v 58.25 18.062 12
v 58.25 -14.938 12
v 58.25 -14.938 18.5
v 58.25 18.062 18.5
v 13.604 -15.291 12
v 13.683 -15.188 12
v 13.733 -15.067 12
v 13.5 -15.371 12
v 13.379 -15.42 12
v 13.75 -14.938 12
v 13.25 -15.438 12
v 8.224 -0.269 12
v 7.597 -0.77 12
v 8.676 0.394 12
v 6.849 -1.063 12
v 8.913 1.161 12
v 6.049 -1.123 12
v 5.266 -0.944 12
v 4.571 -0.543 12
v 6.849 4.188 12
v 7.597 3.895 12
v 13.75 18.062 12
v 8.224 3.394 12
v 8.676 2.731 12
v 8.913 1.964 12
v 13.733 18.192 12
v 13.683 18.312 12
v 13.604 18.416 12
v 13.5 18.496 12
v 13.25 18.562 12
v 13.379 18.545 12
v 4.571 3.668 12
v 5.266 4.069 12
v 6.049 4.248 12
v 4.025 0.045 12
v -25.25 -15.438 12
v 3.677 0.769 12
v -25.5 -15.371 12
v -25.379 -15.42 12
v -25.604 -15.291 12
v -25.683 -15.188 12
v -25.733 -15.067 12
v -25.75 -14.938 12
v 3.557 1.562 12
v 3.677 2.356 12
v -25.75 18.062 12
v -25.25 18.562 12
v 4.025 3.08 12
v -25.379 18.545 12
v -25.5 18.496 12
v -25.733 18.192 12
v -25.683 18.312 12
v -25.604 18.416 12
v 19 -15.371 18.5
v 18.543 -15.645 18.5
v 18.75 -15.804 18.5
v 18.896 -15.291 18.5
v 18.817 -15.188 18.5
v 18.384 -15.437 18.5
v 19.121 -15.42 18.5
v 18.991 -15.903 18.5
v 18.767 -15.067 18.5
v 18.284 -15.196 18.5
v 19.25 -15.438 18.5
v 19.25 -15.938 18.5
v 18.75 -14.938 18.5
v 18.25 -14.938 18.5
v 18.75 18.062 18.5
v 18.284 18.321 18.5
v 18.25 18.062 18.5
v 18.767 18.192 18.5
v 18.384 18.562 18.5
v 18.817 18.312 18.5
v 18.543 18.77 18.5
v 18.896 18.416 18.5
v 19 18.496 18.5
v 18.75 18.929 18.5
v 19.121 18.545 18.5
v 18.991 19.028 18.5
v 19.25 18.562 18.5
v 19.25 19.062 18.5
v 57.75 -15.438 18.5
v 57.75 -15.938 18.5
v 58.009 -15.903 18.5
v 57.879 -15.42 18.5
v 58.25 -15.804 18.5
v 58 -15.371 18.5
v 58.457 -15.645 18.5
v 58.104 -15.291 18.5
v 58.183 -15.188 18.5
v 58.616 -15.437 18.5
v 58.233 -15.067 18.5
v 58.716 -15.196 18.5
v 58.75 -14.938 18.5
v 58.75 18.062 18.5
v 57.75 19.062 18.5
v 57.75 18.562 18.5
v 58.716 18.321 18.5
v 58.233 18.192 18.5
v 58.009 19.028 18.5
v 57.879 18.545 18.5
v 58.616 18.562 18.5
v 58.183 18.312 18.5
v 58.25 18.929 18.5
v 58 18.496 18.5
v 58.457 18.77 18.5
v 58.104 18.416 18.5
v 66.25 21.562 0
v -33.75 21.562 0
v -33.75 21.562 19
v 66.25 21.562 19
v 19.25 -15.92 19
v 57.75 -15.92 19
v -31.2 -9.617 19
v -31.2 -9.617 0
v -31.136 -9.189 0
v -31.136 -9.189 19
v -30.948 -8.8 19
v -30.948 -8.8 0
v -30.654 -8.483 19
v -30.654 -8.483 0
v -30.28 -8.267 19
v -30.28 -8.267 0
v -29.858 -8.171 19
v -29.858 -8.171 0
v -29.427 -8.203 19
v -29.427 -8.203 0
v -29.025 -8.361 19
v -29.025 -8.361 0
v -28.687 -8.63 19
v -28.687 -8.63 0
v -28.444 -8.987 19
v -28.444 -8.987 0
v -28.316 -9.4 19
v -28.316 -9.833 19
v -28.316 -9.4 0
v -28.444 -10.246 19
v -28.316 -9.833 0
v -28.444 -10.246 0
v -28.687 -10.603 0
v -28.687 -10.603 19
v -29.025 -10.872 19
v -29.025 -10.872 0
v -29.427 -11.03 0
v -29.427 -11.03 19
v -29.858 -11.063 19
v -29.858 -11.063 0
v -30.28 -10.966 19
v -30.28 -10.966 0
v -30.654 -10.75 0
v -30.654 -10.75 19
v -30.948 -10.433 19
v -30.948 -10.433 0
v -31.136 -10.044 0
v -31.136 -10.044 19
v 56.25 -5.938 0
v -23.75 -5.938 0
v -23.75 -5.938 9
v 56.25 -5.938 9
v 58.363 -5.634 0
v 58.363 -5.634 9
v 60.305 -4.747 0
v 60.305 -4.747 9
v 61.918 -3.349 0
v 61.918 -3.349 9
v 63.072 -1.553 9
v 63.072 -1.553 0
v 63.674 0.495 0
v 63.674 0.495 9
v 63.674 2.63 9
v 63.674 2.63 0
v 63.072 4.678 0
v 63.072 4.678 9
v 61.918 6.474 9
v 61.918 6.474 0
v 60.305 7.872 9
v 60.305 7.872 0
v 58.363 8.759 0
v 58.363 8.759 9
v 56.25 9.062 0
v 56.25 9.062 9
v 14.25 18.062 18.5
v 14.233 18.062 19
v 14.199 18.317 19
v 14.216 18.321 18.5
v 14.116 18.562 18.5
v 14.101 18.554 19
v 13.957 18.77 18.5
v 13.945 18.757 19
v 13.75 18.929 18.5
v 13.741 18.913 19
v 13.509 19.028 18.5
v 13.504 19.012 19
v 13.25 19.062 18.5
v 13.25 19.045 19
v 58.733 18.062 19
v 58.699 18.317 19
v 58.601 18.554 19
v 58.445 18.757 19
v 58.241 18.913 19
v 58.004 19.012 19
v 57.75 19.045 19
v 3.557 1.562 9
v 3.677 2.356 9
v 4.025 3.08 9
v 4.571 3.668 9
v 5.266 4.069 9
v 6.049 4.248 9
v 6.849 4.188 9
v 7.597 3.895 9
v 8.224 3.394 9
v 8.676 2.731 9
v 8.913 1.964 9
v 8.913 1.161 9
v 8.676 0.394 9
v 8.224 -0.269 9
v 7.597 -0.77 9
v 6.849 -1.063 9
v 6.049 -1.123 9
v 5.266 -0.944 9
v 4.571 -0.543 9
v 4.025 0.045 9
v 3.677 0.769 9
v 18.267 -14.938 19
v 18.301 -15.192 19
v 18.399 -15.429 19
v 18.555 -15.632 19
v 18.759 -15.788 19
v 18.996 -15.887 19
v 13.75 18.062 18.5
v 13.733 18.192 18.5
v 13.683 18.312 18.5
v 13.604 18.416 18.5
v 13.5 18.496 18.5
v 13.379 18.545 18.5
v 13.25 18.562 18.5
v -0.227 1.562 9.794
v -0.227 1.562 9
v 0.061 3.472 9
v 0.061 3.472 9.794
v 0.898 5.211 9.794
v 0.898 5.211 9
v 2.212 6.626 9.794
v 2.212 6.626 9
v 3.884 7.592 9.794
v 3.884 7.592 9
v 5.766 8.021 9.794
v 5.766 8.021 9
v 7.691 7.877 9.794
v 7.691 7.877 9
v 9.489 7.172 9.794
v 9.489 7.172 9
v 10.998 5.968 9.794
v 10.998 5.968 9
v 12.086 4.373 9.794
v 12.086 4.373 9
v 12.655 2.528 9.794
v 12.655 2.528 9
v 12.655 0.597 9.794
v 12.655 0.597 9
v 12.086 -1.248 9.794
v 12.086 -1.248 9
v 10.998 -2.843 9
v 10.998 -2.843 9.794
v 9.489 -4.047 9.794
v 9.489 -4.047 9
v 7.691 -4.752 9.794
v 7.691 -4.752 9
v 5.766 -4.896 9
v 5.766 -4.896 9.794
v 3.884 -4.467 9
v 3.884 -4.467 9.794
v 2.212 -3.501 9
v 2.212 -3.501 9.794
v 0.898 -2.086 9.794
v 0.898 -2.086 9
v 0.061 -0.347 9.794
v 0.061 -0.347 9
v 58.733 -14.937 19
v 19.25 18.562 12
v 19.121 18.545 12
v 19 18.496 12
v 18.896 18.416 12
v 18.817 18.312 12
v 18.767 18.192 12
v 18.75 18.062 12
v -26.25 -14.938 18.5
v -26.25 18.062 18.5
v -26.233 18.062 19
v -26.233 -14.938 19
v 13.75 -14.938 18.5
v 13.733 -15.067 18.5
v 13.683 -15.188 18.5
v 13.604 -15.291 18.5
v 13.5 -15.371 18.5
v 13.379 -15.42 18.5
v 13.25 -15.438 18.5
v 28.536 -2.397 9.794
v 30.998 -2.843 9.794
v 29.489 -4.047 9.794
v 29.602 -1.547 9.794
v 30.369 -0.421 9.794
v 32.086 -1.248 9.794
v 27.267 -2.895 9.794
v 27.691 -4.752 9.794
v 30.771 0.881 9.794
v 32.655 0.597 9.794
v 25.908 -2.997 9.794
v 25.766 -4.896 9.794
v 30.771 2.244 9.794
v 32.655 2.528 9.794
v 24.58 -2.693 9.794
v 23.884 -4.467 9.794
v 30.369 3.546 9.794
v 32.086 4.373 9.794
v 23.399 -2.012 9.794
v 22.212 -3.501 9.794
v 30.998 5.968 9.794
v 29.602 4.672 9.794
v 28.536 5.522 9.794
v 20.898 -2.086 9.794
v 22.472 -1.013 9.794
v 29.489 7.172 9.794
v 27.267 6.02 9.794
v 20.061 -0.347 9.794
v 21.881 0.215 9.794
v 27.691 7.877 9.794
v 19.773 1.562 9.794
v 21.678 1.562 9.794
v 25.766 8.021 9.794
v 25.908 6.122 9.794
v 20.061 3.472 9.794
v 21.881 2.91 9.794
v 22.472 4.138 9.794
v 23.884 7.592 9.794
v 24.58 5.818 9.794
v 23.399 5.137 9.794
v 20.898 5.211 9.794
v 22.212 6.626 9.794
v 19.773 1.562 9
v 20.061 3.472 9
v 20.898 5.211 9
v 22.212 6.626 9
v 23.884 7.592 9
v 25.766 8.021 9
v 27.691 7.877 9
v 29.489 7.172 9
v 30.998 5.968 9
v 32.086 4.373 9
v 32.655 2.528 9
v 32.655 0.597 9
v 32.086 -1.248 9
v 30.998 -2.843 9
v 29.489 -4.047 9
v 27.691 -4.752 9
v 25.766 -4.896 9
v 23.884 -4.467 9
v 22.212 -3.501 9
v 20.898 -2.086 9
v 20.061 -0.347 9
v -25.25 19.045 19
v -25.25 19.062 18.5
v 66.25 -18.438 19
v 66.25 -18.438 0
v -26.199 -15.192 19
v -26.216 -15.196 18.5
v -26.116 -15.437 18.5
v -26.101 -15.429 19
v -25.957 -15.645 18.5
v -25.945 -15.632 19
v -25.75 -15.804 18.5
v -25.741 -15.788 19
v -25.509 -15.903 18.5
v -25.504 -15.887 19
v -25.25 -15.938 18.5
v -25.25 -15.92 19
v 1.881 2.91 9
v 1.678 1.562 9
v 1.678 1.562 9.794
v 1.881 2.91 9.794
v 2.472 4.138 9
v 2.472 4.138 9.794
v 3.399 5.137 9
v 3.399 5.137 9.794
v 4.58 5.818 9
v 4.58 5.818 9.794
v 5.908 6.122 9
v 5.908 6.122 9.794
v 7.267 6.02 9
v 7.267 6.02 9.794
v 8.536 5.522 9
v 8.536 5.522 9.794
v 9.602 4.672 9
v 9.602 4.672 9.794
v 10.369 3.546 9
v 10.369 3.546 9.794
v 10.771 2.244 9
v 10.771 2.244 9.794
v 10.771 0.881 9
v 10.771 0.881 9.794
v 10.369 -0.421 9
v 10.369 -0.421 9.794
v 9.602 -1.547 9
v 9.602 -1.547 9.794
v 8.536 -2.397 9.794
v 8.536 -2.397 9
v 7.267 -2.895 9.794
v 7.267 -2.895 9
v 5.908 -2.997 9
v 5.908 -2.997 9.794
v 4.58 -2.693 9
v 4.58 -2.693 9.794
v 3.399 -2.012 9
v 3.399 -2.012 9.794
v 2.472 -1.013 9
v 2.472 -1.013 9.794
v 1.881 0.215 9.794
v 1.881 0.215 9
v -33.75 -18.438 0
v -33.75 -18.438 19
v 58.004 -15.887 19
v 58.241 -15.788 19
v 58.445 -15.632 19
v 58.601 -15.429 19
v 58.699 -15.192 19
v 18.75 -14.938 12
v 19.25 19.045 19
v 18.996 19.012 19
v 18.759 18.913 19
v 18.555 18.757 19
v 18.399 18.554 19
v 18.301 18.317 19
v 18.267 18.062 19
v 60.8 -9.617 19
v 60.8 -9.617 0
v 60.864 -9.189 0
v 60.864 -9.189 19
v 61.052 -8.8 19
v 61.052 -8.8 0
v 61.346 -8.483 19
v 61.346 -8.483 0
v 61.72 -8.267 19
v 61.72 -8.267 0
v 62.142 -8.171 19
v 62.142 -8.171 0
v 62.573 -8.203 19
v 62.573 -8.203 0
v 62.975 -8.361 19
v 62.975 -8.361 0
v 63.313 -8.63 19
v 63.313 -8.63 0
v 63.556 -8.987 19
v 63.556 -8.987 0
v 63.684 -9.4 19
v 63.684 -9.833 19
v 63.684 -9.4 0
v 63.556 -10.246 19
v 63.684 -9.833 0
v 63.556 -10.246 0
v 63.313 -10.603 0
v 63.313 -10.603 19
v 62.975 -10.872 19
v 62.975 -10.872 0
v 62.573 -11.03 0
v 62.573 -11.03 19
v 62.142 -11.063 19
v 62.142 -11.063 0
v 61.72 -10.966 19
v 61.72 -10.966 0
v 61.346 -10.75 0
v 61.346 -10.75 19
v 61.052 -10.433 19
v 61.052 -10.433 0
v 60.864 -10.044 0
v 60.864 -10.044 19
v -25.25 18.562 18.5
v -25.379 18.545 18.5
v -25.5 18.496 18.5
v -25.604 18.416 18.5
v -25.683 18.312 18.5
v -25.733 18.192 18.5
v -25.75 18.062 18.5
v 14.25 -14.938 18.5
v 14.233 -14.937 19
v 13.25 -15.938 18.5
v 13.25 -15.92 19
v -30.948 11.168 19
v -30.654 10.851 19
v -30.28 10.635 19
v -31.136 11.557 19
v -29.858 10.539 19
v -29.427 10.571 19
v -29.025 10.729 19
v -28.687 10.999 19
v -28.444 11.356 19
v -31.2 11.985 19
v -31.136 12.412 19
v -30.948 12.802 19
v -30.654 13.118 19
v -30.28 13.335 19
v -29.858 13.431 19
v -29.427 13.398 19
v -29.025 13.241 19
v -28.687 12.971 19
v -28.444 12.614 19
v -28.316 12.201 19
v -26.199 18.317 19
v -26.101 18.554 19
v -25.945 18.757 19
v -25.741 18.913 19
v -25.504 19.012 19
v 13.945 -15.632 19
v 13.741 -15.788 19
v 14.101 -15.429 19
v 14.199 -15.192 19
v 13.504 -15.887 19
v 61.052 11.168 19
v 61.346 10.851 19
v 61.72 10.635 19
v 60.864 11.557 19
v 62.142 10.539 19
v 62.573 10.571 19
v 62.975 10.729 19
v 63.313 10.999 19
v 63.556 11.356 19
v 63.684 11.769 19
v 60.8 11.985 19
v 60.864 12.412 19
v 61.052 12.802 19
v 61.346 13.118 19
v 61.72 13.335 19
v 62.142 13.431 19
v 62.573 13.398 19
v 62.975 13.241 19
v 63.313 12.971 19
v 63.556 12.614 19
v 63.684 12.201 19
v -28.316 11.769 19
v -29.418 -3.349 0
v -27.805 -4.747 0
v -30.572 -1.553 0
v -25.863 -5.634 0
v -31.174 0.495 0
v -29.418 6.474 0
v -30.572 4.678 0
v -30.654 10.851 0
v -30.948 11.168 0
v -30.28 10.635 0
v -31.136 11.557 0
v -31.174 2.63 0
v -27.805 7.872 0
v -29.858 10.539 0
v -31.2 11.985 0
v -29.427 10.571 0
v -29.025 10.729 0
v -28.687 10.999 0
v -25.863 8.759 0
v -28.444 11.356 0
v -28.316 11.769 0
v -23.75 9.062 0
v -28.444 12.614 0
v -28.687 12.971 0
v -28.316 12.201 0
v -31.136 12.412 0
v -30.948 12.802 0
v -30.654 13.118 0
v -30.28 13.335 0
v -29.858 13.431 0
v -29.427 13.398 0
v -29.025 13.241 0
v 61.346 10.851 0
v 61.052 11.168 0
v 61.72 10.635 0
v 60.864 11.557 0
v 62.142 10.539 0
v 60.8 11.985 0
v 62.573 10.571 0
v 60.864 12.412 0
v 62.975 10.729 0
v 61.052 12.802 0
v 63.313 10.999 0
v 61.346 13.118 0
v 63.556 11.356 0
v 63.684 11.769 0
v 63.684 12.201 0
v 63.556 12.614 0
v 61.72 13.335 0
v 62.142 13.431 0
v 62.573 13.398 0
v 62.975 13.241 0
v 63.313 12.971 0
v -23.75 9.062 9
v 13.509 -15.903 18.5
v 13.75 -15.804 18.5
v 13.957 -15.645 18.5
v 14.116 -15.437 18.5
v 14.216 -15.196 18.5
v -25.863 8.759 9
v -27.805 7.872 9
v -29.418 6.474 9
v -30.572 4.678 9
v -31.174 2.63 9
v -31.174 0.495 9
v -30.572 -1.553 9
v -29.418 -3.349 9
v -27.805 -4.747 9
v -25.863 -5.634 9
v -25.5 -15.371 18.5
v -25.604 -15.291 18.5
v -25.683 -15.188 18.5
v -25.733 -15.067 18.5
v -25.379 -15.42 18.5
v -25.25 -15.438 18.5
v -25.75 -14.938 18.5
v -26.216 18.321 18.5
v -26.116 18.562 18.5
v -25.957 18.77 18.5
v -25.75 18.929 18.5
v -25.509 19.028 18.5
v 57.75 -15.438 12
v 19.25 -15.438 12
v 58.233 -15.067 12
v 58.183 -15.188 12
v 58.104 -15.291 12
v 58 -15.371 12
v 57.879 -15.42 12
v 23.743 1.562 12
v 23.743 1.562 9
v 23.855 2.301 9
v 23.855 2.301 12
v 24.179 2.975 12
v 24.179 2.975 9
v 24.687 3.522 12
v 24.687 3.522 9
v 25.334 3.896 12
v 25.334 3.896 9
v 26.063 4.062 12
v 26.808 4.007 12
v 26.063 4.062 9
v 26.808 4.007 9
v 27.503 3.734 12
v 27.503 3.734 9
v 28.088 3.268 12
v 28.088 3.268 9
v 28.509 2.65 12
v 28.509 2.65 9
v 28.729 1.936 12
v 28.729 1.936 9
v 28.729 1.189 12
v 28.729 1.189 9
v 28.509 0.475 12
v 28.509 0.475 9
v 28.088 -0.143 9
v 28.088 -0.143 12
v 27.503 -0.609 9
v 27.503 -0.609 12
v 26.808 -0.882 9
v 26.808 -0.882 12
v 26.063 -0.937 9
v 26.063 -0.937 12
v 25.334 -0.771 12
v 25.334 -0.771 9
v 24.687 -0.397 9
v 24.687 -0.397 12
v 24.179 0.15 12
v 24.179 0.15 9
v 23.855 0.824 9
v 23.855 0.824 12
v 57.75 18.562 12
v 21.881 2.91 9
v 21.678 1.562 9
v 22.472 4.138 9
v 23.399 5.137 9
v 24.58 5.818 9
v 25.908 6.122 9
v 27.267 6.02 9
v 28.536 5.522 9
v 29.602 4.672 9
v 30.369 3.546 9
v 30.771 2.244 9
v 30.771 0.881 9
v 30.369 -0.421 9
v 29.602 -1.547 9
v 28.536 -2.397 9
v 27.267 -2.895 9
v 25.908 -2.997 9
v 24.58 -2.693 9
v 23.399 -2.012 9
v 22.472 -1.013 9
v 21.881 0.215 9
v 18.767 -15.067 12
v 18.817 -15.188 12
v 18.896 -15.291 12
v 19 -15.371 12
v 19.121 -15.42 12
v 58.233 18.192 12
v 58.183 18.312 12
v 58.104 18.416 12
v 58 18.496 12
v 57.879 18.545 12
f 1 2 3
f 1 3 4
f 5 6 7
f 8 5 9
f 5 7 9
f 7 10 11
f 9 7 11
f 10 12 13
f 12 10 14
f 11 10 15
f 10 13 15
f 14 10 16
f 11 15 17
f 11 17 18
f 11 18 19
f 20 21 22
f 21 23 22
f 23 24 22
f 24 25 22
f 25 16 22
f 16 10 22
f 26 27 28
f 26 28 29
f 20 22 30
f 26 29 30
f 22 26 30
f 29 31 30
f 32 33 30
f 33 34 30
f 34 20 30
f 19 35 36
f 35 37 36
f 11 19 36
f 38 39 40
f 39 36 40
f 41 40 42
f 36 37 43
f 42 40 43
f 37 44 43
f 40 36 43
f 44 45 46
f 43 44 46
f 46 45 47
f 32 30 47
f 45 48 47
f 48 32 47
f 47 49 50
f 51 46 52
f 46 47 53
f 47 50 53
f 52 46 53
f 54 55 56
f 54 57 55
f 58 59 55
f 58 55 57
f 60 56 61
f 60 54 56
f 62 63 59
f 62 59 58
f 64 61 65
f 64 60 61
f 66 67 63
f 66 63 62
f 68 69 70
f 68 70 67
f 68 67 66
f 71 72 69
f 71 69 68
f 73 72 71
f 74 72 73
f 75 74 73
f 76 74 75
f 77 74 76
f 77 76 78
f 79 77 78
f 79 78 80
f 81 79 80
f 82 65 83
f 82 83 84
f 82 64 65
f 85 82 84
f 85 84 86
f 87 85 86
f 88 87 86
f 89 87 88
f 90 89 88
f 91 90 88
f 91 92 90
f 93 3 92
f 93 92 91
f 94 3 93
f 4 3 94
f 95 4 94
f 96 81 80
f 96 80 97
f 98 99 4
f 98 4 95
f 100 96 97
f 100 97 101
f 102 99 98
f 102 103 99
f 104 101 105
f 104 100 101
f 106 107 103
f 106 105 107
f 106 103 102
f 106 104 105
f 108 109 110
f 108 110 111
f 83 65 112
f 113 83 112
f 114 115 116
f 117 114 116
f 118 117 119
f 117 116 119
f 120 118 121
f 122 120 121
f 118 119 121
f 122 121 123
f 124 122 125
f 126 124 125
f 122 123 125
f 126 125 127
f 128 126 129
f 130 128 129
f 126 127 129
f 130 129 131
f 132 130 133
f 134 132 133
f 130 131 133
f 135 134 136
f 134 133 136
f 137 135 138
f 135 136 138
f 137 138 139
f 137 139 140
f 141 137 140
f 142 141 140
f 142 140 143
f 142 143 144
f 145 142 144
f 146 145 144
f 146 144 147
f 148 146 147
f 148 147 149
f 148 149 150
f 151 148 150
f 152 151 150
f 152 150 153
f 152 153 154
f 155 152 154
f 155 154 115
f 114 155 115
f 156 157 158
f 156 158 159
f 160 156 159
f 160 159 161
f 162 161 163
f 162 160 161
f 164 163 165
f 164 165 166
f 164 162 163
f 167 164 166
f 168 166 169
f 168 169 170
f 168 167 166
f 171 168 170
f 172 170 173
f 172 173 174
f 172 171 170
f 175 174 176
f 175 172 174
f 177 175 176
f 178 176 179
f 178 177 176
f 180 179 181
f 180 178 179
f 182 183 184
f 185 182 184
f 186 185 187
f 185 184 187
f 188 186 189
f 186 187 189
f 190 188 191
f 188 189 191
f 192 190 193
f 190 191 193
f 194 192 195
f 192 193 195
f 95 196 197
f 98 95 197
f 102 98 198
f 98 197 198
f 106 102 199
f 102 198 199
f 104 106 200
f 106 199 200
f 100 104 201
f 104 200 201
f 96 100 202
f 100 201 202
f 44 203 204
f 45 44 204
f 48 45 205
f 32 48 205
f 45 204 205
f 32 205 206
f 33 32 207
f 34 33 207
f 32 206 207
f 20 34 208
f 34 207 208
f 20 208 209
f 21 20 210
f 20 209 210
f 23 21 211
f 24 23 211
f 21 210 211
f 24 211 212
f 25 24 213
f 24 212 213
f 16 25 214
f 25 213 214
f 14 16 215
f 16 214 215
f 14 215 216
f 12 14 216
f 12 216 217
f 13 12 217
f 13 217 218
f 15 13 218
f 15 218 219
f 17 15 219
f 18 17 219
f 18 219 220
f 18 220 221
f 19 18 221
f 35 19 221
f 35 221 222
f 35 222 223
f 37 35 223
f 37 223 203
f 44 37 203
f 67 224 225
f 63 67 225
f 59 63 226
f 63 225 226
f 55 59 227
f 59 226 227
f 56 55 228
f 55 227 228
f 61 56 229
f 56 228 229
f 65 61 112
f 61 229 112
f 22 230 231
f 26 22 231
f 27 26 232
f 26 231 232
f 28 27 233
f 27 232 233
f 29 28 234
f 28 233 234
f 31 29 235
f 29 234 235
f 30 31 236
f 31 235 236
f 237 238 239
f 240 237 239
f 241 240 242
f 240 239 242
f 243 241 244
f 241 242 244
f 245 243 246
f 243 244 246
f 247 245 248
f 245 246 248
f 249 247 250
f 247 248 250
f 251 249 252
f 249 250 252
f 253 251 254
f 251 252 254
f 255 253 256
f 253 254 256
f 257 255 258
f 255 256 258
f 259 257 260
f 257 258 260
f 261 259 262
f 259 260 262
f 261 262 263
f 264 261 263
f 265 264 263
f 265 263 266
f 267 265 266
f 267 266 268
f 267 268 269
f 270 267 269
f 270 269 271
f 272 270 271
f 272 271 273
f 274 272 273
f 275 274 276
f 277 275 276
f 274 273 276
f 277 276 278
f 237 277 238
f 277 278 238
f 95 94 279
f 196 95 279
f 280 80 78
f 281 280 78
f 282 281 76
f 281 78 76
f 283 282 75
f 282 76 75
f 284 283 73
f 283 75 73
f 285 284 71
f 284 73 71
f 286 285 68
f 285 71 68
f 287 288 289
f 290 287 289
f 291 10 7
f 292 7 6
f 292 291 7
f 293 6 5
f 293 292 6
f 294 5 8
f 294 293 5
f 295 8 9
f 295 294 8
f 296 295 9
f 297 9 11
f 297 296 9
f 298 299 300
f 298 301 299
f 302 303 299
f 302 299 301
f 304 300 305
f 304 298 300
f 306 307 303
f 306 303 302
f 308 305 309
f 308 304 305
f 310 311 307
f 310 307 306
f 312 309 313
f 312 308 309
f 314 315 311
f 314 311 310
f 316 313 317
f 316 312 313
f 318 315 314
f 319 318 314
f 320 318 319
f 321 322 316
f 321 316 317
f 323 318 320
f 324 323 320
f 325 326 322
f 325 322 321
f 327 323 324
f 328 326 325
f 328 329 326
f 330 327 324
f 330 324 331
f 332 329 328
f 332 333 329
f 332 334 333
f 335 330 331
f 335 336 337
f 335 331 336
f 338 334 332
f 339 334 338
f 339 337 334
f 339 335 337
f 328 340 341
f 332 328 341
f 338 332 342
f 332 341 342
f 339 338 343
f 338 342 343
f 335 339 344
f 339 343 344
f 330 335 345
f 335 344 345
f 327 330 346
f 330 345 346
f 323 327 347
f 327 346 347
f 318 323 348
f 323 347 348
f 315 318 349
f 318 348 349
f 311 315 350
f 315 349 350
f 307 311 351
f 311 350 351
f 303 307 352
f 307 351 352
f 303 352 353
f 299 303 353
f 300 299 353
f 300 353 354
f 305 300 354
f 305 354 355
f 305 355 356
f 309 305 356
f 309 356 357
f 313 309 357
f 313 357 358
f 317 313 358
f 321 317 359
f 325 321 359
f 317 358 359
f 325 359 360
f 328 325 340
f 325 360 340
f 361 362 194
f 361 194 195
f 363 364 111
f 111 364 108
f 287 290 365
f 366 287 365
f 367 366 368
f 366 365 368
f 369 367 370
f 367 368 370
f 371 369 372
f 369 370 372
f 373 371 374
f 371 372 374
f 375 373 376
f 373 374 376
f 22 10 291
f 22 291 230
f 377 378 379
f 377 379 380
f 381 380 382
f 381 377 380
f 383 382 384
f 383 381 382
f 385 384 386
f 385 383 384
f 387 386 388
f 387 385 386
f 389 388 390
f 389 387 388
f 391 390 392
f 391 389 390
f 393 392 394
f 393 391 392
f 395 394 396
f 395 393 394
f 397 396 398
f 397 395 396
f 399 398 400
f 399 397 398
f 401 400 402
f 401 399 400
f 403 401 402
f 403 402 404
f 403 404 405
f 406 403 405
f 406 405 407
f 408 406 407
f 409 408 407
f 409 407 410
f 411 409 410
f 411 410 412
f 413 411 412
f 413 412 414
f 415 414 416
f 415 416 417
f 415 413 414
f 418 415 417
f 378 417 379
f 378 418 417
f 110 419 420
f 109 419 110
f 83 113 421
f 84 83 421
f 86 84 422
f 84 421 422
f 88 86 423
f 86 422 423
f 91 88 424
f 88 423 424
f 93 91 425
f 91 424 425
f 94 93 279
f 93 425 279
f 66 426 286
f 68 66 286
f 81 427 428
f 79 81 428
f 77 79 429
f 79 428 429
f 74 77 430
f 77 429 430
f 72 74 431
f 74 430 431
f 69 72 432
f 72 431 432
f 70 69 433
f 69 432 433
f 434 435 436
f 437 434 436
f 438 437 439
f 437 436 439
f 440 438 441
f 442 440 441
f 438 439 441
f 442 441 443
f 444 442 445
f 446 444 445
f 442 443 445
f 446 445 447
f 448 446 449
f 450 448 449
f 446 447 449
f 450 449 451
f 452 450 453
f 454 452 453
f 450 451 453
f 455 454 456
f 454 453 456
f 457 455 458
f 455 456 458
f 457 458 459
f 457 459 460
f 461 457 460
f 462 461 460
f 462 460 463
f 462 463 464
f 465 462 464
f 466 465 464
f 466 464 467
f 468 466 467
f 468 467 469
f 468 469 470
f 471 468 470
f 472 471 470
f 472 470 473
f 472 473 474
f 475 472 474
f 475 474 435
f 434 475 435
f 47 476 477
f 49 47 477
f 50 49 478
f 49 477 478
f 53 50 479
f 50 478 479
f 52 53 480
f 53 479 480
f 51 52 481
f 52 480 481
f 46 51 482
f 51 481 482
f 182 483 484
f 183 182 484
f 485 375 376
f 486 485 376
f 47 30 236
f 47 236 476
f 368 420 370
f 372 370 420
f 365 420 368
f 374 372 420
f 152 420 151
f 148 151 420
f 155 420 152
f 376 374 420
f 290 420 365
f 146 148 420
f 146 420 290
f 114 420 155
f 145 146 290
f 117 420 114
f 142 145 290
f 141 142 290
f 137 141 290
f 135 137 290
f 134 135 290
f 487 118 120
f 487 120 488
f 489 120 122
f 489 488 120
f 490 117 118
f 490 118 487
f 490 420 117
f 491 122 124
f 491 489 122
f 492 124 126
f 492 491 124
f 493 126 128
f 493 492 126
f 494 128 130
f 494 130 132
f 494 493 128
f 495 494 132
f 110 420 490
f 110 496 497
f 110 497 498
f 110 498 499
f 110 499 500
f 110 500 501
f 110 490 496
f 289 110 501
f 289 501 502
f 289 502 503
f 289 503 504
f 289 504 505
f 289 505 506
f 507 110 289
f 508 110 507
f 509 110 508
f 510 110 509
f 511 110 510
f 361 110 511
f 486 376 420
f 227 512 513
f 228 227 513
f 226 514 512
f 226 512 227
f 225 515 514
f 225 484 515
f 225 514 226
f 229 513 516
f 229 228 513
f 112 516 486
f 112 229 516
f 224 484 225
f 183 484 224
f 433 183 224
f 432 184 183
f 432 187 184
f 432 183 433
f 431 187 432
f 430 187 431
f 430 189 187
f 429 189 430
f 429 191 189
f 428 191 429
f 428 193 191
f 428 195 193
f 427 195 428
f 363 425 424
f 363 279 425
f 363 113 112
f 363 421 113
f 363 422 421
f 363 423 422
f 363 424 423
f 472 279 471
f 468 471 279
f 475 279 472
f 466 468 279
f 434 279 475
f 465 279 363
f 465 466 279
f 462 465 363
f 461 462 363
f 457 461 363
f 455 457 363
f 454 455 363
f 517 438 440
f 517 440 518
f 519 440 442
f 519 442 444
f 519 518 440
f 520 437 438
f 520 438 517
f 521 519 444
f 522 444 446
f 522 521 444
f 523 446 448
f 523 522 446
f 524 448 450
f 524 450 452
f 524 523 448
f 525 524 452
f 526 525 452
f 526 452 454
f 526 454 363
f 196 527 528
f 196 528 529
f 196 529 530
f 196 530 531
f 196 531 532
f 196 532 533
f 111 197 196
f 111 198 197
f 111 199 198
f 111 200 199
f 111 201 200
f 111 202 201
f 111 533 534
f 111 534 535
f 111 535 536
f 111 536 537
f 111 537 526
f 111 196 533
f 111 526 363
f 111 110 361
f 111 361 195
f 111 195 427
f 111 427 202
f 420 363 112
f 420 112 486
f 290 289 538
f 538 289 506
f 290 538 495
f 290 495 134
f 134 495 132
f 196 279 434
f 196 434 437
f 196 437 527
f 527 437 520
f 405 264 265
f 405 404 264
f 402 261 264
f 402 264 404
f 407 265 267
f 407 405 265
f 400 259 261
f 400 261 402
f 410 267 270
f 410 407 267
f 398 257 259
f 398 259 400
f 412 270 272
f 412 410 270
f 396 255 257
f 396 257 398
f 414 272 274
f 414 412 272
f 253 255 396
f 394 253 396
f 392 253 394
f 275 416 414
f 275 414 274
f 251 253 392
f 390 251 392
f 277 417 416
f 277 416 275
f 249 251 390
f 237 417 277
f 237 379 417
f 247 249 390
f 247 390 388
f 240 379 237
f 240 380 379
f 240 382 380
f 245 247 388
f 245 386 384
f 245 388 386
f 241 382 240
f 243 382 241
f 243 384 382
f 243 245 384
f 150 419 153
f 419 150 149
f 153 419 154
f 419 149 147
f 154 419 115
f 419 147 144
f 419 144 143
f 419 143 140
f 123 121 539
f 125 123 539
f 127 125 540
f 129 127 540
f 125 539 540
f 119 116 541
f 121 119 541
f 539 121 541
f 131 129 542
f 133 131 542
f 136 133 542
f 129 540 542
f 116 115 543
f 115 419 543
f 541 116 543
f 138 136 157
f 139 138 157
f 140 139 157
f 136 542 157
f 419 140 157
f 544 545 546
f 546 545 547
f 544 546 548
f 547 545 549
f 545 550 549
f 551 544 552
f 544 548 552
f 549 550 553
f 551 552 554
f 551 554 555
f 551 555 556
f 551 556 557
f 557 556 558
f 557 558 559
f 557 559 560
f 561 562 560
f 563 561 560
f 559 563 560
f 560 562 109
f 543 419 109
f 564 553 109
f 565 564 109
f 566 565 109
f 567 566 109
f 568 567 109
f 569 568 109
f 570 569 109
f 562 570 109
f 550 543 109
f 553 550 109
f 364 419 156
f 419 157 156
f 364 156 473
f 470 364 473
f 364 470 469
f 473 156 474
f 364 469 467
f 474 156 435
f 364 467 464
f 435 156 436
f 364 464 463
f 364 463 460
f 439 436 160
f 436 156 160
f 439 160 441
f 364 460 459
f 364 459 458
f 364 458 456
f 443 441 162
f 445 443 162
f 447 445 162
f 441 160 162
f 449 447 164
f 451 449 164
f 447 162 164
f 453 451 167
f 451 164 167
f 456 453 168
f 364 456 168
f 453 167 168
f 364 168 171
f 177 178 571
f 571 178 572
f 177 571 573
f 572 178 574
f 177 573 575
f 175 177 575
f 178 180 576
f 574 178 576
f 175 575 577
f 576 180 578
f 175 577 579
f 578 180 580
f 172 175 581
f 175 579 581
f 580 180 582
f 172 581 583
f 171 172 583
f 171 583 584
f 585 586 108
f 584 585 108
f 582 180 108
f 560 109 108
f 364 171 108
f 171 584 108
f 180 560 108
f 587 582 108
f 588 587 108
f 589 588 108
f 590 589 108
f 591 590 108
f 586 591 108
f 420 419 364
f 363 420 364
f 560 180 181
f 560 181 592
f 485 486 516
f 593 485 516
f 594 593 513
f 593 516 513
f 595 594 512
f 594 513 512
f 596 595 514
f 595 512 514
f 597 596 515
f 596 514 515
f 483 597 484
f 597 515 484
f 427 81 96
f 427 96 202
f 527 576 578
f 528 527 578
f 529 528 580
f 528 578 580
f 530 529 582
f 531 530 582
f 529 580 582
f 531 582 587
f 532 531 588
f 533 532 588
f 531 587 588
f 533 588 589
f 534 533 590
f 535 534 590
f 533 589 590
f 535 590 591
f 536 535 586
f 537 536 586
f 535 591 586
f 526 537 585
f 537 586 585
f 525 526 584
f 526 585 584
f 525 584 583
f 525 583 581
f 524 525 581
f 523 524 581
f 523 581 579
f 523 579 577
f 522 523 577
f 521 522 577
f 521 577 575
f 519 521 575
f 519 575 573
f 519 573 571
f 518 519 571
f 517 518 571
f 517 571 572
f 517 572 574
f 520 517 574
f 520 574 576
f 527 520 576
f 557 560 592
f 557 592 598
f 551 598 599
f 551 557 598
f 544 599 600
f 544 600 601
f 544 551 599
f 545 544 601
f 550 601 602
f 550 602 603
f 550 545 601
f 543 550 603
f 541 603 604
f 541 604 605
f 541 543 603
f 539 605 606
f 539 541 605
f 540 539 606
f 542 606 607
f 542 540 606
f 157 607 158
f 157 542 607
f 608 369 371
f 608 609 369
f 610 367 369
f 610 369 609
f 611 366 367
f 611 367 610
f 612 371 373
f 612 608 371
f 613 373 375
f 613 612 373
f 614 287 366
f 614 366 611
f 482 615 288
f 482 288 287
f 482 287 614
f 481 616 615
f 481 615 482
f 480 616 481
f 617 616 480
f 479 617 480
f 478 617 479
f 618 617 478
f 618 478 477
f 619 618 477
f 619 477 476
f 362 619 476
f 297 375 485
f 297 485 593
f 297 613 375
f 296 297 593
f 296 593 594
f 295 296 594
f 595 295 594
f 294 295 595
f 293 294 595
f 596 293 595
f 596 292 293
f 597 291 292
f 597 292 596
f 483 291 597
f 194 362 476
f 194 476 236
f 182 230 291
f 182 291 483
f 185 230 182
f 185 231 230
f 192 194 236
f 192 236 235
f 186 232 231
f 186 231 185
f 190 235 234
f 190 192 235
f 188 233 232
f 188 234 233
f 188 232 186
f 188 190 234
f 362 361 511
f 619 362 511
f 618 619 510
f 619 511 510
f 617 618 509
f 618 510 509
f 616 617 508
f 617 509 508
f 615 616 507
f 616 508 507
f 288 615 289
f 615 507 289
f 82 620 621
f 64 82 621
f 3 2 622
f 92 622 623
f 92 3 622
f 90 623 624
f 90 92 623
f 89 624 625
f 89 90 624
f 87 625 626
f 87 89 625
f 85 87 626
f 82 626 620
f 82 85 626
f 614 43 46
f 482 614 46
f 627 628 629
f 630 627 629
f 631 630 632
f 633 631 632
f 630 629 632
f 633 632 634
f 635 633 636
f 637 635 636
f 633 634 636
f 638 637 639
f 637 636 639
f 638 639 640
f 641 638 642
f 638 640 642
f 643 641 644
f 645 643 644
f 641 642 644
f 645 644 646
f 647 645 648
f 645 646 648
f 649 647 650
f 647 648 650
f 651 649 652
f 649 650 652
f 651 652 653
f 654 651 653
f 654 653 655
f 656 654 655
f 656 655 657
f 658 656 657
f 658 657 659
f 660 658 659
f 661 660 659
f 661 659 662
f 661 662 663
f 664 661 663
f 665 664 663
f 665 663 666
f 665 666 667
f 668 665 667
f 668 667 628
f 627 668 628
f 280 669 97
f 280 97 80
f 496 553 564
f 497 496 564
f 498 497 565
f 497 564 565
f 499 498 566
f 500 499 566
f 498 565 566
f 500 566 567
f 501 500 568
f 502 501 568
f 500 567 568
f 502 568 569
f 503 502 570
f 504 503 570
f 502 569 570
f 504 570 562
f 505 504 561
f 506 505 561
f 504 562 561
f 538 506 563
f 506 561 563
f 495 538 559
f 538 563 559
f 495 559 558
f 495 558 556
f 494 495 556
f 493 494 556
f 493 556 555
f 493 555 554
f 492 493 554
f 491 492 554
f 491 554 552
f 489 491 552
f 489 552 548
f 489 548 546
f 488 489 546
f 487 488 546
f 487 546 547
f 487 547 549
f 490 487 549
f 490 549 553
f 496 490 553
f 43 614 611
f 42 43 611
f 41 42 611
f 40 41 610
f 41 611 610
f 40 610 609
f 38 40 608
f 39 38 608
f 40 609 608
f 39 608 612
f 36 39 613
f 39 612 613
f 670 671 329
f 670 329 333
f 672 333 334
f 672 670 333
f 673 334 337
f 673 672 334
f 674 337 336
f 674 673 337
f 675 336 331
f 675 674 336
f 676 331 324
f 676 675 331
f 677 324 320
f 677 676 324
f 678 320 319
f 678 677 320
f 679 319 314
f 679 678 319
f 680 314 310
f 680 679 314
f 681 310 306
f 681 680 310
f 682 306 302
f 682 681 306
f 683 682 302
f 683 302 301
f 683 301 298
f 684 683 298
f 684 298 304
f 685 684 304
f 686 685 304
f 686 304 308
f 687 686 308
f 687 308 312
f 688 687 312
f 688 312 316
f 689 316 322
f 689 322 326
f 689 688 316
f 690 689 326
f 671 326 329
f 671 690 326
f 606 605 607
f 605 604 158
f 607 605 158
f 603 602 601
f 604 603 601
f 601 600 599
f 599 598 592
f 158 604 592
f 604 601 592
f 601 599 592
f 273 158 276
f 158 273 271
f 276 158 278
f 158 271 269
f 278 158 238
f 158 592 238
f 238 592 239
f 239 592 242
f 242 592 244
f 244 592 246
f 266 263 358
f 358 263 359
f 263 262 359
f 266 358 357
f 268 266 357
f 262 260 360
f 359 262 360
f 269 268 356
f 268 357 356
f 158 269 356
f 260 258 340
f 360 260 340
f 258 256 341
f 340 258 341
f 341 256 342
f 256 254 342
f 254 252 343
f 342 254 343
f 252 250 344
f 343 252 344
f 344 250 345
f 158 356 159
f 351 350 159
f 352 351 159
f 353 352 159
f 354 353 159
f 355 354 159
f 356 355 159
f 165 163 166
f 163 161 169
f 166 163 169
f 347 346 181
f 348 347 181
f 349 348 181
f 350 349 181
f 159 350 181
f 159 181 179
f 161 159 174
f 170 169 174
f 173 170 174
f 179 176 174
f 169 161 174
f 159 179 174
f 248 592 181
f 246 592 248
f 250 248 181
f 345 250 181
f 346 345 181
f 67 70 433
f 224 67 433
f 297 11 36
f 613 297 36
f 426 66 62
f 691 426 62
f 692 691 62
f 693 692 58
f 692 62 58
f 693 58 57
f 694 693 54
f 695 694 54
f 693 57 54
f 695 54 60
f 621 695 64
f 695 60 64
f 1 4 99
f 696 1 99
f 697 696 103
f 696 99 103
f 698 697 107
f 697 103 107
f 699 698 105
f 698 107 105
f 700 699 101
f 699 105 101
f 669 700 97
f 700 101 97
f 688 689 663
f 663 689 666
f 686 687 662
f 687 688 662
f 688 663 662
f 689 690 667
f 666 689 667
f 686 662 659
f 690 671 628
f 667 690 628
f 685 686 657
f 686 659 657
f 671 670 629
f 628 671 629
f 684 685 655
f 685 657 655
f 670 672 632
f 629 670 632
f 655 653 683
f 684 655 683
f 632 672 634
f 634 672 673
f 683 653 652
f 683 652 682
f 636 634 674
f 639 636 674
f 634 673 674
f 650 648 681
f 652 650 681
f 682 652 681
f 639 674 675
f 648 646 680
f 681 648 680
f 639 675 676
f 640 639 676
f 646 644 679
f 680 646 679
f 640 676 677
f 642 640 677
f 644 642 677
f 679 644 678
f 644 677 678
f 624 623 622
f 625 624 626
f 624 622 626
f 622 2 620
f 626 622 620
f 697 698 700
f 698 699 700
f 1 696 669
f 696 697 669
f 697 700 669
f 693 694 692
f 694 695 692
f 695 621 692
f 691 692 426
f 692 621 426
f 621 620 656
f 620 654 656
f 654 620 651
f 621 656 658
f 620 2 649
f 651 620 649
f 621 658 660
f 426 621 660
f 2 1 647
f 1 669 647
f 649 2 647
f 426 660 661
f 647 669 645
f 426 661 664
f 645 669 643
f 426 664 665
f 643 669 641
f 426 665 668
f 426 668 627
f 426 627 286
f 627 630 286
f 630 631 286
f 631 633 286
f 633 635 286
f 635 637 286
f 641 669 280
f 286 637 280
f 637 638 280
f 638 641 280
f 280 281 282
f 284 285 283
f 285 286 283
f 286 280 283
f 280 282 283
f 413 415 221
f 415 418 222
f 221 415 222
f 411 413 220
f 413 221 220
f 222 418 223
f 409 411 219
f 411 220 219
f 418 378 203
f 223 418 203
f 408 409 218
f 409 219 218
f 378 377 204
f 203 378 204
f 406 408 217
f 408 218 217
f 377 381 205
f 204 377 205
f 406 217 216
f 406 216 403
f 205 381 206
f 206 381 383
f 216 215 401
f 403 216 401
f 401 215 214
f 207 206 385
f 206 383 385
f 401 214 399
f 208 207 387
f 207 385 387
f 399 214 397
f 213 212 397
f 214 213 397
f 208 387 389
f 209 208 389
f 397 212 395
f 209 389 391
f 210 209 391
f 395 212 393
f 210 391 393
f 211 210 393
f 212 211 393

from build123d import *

# Parameters (mm, degrees)
SKETCH1_W           = 100
SKETCH1_H           = 40
BOSS_EXTRUDE1_DEPTH = 38
CUT_EXTRUDE2_START  = -12
SKETCH2_W           = 39.5
SKETCH2_H           = 34
CUT_EXTRUDE2_DEPTH  = 21
CUT_EXTRUDE4_REACH  = 81.36
SKETCH4_R           = 1.45
SKETCH6_W           = 100
SKETCH6_H           = 19
CUT_EXTRUDE5_DEPTH  = 87.215210375
FILLET1_R           = 0.5
CUT_EXTRUDE6_START  = 6.5
CUT_EXTRUDE6_DEPTH  = 0.5
CUT_EXTRUDE6_TAPER  = 2
CUT_EXTRUDE7_START  = 6.5
CUT_EXTRUDE7_DEPTH  = 0.5
CUT_EXTRUDE7_TAPER  = 2
CUT_EXTRUDE12_DEPTH = 9
CUT_EXTRUDE13_REACH = 72.385
SKETCH18_R          = 2.506862912
SKETCH18_R_2        = 2.693115416
SKETCH19_R          = 6.477
SKETCH19_R_2        = 4.572
CUT_EXTRUDE14_DEPTH = 0.79375


with BuildPart() as part:
    # Sketch1 → Boss-Extrude1 (new body)
    with BuildSketch(Plane.XY):
        with Locations((16.25, 1.5625)):
            Rectangle(SKETCH1_W, SKETCH1_H)
    extrude(amount=BOSS_EXTRUDE1_DEPTH)

    # Sketch2 → Cut-Extrude2 (cut)
    with BuildSketch(Plane(origin=(0, 0, 0), x_dir=(-1, 0, 0), z_dir=(0, 0, -1)).offset(CUT_EXTRUDE2_START)):
        with Locations((-38.5, 1.5625)):
            Rectangle(SKETCH2_W, SKETCH2_H)
        with Locations((6, 1.5625)):
            Rectangle(SKETCH2_W, SKETCH2_H)
    extrude(amount=-CUT_EXTRUDE2_DEPTH, mode=Mode.SUBTRACT)

    # Sketch4 → Cut-Extrude4 (cut, up to next)
    with BuildSketch(Plane(origin=(0, 0, 0), x_dir=(-1, 0, 0), z_dir=(0, 0, -1)), mode=Mode.PRIVATE) as cut_extrude4_sk1:
        with Locations((-62.25, 11.98479819)):
            Circle(SKETCH4_R)
    cut_extrude4_tool1 = extrude(cut_extrude4_sk1.sketch, amount=-CUT_EXTRUDE4_REACH, mode=Mode.PRIVATE) & part.part
    # Sketch4 → Cut-Extrude4 (cut, up to next)
    with BuildSketch(Plane(origin=(0, 0, 0), x_dir=(-1, 0, 0), z_dir=(0, 0, -1)), mode=Mode.PRIVATE) as cut_extrude4_sk2:
        with Locations((-62.25, -9.616561755)):
            Circle(SKETCH4_R)
    cut_extrude4_tool2 = extrude(cut_extrude4_sk2.sketch, amount=-CUT_EXTRUDE4_REACH, mode=Mode.PRIVATE) & part.part
    # Sketch4 → Cut-Extrude4 (cut, up to next)
    with BuildSketch(Plane(origin=(0, 0, 0), x_dir=(-1, 0, 0), z_dir=(0, 0, -1)), mode=Mode.PRIVATE) as cut_extrude4_sk3:
        with Locations((29.75, 11.98479819)):
            Circle(SKETCH4_R)
    cut_extrude4_tool3 = extrude(cut_extrude4_sk3.sketch, amount=-CUT_EXTRUDE4_REACH, mode=Mode.PRIVATE) & part.part
    # Sketch4 → Cut-Extrude4 (cut, up to next)
    with BuildSketch(Plane(origin=(0, 0, 0), x_dir=(-1, 0, 0), z_dir=(0, 0, -1)), mode=Mode.PRIVATE) as cut_extrude4_sk4:
        with Locations((29.75, -9.616561755)):
            Circle(SKETCH4_R)
    cut_extrude4_tool4 = extrude(cut_extrude4_sk4.sketch, amount=-CUT_EXTRUDE4_REACH, mode=Mode.PRIVATE) & part.part
    add(cut_extrude4_tool1.solids().sort_by_distance((62.25, 11.984798, 0))[0], mode=Mode.SUBTRACT)
    add(cut_extrude4_tool2.solids().sort_by_distance((62.25, -9.616562, 0))[0], mode=Mode.SUBTRACT)
    add(cut_extrude4_tool3.solids().sort_by_distance((-29.75, 11.984798, 0))[0], mode=Mode.SUBTRACT)
    add(cut_extrude4_tool4.solids().sort_by_distance((-29.75, -9.616562, 0))[0], mode=Mode.SUBTRACT)

    # Sketch6 → Cut-Extrude5 (cut, through all)
    with BuildSketch(Plane(origin=(0, 21.5625, 0), x_dir=(1, 0, 0), z_dir=(0, 1, 0))):
        with Locations((16.25, -28.5)):
            Rectangle(SKETCH6_W, SKETCH6_H)
    extrude(amount=-CUT_EXTRUDE5_DEPTH, mode=Mode.SUBTRACT)

    # Fillet1
    fillet1_edges = [part.edges().sort_by_distance(p)[0] for p in [
        (-25.75, -15.4375, 15.5),
        (13.75, -15.4375, 15.5),
        (-25.75, 18.5625, 15.5),
        (13.75, 18.5625, 15.5),
        (18.75, -15.4375, 15.5),
        (58.25, -15.4375, 15.5),
        (18.75, 18.5625, 15.5),
        (58.25, 18.5625, 15.5),
    ]]
    fillet(fillet1_edges, radius=FILLET1_R)

    # Sketch10 → Cut-Extrude6 (cut)
    with BuildSketch(Plane.XY.offset(12).offset(CUT_EXTRUDE6_START)):
        with BuildLine():
            Line((14.25, -14.9375), (14.25, 18.0625))
            ThreePointArc((14.25, 18.0625), (13.957106781, 18.769606781), (13.25, 19.0625))
            Line((13.25, 19.0625), (-25.25, 19.0625))
            ThreePointArc((-25.25, 19.0625), (-25.957106781, 18.769606781), (-26.25, 18.0625))
            Line((-26.25, 18.0625), (-26.25, -14.9375))
            ThreePointArc((-26.25, -14.9375), (-25.957106781, -15.644606781), (-25.25, -15.9375))
            Line((-25.25, -15.9375), (13.25, -15.9375))
            ThreePointArc((13.25, -15.9375), (13.957106781, -15.644606781), (14.25, -14.9375))
        make_face()
    extrude(amount=CUT_EXTRUDE6_DEPTH, taper=CUT_EXTRUDE6_TAPER, mode=Mode.SUBTRACT)

    # Sketch11 → Cut-Extrude7 (cut)
    with BuildSketch(Plane.XY.offset(12).offset(CUT_EXTRUDE7_START)):
        with BuildLine():
            Line((58.75, -14.9375), (58.75, 18.0625))
            ThreePointArc((58.75, 18.0625), (58.457106781, 18.769606781), (57.75, 19.0625))
            Line((57.75, 19.0625), (19.25, 19.0625))
            ThreePointArc((19.25, 19.0625), (18.542893219, 18.769606781), (18.25, 18.0625))
            Line((18.25, 18.0625), (18.25, -14.9375))
            ThreePointArc((18.25, -14.9375), (18.542893219, -15.644606781), (19.25, -15.9375))
            Line((19.25, -15.9375), (57.75, -15.9375))
            ThreePointArc((57.75, -15.9375), (58.457106781, -15.644606781), (58.75, -14.9375))
        make_face()
    extrude(amount=CUT_EXTRUDE7_DEPTH, taper=CUT_EXTRUDE7_TAPER, mode=Mode.SUBTRACT)

    # Sketch17 → Cut-Extrude12 (cut)
    with BuildSketch(Plane(origin=(0, 0, 0), x_dir=(-1, 0, 0), z_dir=(0, 0, -1))):
        with BuildLine():
            Line((-56.25, 9.0625), (23.75, 9.0625))
            ThreePointArc((23.75, 9.0625), (31.25, 1.5625), (23.75, -5.9375))
            Line((23.75, -5.9375), (-56.25, -5.9375))
            ThreePointArc((-56.25, -5.9375), (-63.75, 1.5625), (-56.25, 9.0625))
        make_face()
    extrude(amount=-CUT_EXTRUDE12_DEPTH, mode=Mode.SUBTRACT)

    # Sketch18 → Cut-Extrude13 (cut, up to next)
    with BuildSketch(Plane(origin=(0, 0, 9), x_dir=(-1, 0, 0), z_dir=(0, 0, -1)), mode=Mode.PRIVATE) as cut_extrude13_sk1:
        with Locations((-26.25, 1.5625)):
            Circle(SKETCH18_R)
    cut_extrude13_tool1 = extrude(cut_extrude13_sk1.sketch, amount=-CUT_EXTRUDE13_REACH, mode=Mode.PRIVATE) & part.part
    # Sketch18 → Cut-Extrude13 (cut, up to next)
    with BuildSketch(Plane(origin=(0, 0, 9), x_dir=(-1, 0, 0), z_dir=(0, 0, -1)), mode=Mode.PRIVATE) as cut_extrude13_sk2:
        with Locations((-6.25, 1.5625)):
            Circle(SKETCH18_R_2)
    cut_extrude13_tool2 = extrude(cut_extrude13_sk2.sketch, amount=-CUT_EXTRUDE13_REACH, mode=Mode.PRIVATE) & part.part
    add(cut_extrude13_tool1.solids().sort_by_distance((26.25, 1.5625, 9))[0], mode=Mode.SUBTRACT)
    add(cut_extrude13_tool2.solids().sort_by_distance((6.25, 1.5625, 9))[0], mode=Mode.SUBTRACT)

    # Sketch19 → Cut-Extrude14 (cut)
    # profile 1 of 2: a face of its own
    with BuildSketch(Plane(origin=(0, 0, 9), x_dir=(-1, 0, 0), z_dir=(0, 0, -1))):
        with Locations((-26.25, 1.5625)):
            Circle(SKETCH19_R)
        with Locations((-26.25, 1.5625)):
            Circle(SKETCH19_R_2, mode=Mode.SUBTRACT)
    # profile 2 of 2: a face of its own
    with BuildSketch(Plane(origin=(0, 0, 9), x_dir=(-1, 0, 0), z_dir=(0, 0, -1))):
        with Locations((-6.25, 1.5625)):
            Circle(SKETCH19_R)
        with Locations((-6.25, 1.5625)):
            Circle(SKETCH19_R_2, mode=Mode.SUBTRACT)
    extrude(amount=-CUT_EXTRUDE14_DEPTH, mode=Mode.SUBTRACT)


solid = part.part
